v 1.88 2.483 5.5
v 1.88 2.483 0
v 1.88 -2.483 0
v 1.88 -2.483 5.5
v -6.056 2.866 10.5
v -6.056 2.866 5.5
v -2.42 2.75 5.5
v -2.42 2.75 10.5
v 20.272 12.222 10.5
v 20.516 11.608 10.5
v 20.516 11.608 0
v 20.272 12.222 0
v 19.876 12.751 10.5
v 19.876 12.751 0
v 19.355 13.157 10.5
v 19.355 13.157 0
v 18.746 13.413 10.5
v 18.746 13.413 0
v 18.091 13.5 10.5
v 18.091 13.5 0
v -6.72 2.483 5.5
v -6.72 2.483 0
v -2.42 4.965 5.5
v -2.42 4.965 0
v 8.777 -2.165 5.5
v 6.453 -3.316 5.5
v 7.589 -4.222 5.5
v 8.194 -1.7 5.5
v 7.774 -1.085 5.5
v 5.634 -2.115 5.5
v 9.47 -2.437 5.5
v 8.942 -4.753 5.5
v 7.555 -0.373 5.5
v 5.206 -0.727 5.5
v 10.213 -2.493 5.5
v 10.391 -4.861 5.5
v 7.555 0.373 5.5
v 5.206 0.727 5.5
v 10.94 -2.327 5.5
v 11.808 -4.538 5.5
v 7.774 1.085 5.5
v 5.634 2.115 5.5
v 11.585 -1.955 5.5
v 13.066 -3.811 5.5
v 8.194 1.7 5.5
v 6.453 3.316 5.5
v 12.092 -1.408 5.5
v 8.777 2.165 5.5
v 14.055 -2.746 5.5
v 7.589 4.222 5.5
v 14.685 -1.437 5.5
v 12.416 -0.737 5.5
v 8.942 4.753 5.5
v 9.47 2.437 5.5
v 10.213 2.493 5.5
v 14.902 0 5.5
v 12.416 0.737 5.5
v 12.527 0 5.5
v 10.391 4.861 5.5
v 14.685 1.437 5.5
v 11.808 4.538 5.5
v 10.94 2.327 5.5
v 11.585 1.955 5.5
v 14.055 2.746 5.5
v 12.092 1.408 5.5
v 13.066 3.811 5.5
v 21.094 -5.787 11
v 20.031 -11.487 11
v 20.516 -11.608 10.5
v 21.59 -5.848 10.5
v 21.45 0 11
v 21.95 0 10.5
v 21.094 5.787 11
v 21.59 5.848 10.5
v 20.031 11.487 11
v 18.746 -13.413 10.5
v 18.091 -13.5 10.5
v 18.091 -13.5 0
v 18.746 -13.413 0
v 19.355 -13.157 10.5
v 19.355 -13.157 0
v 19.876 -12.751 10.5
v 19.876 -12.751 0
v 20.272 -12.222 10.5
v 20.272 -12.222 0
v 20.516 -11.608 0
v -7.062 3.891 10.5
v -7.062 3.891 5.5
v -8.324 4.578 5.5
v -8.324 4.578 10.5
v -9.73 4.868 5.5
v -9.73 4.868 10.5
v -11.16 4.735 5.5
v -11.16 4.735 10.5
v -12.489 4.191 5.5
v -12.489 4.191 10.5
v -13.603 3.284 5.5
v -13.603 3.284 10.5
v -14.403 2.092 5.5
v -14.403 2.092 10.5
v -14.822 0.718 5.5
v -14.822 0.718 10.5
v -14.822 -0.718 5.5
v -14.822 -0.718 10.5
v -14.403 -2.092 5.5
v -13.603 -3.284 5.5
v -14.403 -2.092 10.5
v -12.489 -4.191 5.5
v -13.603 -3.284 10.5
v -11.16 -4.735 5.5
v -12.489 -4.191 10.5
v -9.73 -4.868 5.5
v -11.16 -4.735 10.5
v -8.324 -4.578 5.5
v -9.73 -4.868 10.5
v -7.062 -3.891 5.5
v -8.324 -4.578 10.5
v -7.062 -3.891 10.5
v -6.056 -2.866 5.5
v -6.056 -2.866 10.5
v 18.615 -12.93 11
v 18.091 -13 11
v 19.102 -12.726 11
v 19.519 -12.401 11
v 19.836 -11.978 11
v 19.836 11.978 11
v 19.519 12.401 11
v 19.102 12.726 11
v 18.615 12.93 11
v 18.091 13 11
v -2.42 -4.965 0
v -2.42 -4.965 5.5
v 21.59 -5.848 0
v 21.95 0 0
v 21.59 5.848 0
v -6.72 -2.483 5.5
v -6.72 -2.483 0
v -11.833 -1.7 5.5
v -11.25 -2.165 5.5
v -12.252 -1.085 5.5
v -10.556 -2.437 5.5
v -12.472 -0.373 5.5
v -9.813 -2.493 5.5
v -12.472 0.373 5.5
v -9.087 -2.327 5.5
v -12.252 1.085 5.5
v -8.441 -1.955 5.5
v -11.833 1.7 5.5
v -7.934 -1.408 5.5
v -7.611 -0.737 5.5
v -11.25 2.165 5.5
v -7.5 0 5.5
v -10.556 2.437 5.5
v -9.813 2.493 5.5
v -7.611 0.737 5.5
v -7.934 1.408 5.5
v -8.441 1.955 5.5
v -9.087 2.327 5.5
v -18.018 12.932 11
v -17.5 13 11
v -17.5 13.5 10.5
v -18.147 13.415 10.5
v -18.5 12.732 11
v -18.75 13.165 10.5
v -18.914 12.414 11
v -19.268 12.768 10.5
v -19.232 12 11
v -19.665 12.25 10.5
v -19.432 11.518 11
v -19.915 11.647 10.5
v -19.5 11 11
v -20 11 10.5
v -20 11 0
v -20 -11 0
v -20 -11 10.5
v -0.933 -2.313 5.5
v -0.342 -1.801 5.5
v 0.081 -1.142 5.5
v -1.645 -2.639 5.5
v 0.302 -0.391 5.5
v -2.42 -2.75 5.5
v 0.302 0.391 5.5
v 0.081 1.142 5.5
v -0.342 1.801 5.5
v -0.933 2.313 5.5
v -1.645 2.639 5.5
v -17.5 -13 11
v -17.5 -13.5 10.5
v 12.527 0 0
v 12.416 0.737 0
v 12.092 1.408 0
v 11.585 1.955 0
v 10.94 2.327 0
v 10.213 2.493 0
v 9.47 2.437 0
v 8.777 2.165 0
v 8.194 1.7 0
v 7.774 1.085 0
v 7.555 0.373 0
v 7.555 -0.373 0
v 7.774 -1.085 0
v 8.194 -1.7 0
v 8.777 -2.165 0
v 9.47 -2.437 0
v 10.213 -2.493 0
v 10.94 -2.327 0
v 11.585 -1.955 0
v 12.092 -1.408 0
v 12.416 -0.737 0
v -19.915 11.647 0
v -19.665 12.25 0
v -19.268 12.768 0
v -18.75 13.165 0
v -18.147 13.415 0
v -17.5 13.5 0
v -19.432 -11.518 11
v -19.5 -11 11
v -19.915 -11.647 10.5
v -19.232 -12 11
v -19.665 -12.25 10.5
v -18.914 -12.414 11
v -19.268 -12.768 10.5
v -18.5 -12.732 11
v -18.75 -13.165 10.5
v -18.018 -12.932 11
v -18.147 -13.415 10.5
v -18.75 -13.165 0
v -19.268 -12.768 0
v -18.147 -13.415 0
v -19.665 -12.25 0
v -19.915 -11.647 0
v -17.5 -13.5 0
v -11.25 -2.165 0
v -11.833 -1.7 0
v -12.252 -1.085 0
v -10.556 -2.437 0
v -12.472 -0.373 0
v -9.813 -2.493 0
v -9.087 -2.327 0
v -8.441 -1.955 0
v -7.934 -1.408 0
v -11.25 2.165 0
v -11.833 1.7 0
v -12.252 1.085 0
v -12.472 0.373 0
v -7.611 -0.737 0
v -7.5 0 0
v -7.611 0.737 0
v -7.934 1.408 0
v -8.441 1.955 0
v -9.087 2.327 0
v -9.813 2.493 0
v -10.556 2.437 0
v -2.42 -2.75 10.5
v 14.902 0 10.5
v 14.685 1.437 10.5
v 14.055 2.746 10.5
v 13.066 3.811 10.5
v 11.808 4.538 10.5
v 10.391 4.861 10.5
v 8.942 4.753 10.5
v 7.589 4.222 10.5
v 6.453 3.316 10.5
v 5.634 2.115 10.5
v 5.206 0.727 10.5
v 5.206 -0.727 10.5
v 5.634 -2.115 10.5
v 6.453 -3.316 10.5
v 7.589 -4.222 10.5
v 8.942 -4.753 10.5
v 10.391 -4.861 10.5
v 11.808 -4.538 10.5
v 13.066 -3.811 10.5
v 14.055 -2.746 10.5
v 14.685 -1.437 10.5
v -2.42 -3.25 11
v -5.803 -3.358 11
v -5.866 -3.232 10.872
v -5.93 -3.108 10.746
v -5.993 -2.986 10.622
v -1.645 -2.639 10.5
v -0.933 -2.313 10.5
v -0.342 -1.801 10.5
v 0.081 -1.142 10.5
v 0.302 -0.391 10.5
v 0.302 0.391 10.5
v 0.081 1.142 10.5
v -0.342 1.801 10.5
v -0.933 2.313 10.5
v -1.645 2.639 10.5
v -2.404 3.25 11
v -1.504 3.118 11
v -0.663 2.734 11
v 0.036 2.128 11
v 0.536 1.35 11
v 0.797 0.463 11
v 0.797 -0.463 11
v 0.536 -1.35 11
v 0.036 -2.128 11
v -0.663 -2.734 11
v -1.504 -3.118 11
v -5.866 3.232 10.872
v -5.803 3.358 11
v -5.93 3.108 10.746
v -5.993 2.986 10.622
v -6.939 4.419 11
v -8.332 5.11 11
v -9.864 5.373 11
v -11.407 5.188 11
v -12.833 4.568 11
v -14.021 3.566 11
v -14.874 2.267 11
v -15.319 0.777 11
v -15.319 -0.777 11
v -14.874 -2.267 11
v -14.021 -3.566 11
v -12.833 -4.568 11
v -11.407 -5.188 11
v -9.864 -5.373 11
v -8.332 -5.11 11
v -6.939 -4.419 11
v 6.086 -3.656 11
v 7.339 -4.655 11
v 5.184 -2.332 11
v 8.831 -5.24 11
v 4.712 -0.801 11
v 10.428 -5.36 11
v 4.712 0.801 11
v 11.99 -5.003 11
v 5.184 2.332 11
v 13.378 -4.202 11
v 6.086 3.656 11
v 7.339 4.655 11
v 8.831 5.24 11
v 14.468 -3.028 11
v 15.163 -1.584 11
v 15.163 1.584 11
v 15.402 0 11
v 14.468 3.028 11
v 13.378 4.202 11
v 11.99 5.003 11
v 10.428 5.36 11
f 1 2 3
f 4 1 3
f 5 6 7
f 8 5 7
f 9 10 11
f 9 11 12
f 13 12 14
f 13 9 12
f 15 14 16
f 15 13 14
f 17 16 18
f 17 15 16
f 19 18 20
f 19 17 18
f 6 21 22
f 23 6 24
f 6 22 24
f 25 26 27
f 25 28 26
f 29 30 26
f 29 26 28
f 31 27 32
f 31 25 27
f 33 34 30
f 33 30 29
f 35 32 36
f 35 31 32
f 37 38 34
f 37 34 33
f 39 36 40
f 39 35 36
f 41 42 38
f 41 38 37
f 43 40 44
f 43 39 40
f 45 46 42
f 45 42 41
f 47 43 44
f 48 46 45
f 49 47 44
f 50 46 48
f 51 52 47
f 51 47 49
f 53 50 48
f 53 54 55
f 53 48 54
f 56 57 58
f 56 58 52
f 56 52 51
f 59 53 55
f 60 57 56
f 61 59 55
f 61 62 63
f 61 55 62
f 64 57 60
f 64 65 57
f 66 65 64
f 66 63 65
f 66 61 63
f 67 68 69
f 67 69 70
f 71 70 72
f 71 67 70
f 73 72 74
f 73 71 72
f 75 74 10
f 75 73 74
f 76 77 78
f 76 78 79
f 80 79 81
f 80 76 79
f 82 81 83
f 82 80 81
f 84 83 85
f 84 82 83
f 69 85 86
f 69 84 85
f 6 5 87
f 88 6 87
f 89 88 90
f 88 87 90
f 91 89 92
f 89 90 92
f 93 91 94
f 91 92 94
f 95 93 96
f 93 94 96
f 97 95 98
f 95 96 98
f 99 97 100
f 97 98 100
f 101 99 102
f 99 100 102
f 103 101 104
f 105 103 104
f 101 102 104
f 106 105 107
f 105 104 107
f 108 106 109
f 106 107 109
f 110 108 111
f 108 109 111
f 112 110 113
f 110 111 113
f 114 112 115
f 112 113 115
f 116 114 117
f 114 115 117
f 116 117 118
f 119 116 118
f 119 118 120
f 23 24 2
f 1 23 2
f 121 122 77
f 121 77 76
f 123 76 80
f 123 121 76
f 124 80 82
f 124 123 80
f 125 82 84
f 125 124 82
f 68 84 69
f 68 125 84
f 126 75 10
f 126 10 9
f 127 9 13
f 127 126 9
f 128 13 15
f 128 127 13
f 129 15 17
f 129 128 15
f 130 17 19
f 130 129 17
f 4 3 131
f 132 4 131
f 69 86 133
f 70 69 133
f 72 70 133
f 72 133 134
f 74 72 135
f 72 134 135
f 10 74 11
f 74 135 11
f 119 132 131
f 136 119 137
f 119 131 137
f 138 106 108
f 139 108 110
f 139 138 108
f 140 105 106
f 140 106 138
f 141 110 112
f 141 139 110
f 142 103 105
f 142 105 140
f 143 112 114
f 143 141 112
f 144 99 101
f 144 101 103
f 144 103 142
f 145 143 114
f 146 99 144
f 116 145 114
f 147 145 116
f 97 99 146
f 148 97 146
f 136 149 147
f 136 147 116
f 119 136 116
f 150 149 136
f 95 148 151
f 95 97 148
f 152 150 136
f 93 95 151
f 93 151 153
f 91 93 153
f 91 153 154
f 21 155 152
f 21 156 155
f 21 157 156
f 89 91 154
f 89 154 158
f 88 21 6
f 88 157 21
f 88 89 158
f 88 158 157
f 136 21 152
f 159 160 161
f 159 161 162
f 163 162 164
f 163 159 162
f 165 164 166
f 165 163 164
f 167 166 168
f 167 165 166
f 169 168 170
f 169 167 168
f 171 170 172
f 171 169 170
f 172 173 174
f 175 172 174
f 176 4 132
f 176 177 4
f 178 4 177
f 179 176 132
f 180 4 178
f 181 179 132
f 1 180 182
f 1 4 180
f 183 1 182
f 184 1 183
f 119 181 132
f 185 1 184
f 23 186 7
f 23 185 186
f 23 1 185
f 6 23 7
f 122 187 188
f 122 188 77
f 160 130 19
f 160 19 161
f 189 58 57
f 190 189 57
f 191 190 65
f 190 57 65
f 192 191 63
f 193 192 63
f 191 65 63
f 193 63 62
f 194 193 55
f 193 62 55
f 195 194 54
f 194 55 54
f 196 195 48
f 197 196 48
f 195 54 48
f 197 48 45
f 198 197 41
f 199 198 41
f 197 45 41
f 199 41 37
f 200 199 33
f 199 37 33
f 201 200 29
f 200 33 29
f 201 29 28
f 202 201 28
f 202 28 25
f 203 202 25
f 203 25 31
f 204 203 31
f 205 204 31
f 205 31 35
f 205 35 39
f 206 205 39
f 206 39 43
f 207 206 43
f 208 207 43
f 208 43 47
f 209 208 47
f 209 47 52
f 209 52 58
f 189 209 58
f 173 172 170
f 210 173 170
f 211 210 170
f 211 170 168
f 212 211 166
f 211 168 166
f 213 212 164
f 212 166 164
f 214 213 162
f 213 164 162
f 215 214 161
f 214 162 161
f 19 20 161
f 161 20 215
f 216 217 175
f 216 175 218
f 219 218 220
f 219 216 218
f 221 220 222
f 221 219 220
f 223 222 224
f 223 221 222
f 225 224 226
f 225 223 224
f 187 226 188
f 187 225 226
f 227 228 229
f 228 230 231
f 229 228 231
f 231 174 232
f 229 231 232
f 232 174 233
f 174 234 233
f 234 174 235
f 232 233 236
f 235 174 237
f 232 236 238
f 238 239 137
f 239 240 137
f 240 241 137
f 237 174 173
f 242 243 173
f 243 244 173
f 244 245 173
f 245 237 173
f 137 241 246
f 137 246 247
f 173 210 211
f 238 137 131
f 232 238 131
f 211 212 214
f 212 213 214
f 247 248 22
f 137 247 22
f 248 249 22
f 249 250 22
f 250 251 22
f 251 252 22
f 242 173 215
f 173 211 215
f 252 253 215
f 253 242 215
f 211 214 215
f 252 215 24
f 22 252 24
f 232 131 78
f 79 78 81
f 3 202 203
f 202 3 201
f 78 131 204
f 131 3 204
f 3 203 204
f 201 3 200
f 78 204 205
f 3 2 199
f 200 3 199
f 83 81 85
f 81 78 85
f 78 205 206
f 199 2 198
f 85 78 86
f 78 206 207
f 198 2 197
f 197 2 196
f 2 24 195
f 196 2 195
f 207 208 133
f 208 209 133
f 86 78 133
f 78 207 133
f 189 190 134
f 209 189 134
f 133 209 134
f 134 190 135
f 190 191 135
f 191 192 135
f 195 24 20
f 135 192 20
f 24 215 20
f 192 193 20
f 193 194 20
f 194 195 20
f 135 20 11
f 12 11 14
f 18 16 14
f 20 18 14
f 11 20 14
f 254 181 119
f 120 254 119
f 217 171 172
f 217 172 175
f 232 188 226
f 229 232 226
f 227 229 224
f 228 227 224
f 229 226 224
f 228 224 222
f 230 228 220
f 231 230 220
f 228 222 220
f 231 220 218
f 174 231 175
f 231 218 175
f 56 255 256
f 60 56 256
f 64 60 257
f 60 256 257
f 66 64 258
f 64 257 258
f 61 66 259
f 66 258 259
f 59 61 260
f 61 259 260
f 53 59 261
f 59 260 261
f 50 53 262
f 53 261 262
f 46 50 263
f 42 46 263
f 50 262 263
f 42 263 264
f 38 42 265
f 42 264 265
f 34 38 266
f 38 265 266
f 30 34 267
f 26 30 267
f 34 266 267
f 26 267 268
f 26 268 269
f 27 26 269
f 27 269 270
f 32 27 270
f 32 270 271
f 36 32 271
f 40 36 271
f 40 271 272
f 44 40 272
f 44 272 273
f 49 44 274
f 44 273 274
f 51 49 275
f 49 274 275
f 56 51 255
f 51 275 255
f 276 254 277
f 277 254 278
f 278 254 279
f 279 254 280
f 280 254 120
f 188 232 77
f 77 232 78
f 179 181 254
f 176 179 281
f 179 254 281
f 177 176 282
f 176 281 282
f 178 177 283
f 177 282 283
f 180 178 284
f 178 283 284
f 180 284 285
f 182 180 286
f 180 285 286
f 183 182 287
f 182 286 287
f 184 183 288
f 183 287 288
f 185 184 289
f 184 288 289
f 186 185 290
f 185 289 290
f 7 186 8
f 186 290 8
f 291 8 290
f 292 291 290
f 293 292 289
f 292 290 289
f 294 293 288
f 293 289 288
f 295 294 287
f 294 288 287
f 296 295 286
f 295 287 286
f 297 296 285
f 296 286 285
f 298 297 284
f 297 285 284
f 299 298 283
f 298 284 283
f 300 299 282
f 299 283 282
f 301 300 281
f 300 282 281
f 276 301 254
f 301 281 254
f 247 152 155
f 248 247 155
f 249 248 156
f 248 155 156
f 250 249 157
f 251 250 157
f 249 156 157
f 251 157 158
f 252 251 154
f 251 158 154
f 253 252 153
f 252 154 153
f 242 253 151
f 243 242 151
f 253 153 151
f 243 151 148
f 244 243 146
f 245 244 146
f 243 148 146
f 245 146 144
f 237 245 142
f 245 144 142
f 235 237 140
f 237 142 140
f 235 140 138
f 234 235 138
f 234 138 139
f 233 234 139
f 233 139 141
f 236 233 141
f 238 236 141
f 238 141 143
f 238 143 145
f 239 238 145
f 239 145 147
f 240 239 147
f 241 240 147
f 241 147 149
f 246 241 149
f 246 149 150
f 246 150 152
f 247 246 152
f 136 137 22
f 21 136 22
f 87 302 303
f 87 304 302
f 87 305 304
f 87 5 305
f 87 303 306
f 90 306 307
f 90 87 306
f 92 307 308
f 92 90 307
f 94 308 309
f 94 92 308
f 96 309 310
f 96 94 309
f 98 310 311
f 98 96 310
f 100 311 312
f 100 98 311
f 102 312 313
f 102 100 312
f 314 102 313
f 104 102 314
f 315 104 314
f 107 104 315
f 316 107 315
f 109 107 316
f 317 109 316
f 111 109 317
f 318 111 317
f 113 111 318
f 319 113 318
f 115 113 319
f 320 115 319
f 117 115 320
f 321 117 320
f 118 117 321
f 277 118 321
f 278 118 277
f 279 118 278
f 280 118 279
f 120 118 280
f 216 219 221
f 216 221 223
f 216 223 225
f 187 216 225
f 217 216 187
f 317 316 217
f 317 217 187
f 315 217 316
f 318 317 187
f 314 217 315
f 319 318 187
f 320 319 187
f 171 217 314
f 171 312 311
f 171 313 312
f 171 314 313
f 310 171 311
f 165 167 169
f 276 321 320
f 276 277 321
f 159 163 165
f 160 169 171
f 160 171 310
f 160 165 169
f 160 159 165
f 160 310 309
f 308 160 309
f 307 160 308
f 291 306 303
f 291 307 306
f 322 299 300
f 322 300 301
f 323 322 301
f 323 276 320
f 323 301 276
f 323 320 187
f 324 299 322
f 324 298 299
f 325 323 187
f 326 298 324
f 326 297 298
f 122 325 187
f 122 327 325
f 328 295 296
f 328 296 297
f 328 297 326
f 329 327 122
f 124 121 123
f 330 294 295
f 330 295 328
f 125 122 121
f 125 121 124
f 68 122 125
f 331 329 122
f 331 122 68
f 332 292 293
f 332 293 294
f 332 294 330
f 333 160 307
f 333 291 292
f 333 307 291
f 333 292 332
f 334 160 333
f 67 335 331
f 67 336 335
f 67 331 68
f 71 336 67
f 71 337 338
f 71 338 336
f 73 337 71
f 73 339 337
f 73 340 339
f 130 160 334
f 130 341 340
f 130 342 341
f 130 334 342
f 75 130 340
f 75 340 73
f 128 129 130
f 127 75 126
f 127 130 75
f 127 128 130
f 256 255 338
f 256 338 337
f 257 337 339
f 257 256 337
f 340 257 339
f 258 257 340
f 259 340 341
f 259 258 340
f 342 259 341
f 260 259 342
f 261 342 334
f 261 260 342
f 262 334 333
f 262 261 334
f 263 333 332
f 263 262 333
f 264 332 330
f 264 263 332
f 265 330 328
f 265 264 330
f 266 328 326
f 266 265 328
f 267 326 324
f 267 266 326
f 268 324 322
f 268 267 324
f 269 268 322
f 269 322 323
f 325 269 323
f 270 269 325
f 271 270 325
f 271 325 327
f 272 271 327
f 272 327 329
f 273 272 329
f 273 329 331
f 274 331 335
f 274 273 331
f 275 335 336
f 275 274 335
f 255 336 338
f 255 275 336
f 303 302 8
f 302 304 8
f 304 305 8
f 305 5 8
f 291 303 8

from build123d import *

# Parameters (mm, degrees)
BOSS_EXTRUDE1_DEPTH     = 11
SKETCH2_R               = 2.5
CUT_EXTRUDE1_DEPTH      = 29.018788339
SKETCH3_R               = 4.875
CUT_EXTRUDE2_DEPTH      = 5.5
SKETCH4_R               = 2.75
CUT_EXTRUDE3_DEPTH      = 29.018788339
CUT_EXTRUDE4_DEPTH      = 5.5
FILLET1_R               = 2.5
CHAMFER1_SIZE           = 0.5
CUT_EXTRUDE5_DEPTH      = 29.018788339
CUT_EXTRUDE5_DEPTH_BACK = 29.018788339
CHAMFER3_SIZE           = 0.5


with BuildPart() as part:
    # Sketch1 → Boss-Extrude1 (new body)
    with BuildSketch(Plane.XY):
        with BuildLine():
            Line((-20, -13.5), (20, -13.5))
            ThreePointArc((20, -13.5), (21.95, 0), (20, 13.5))
            Line((20, 13.5), (-20, 13.5))
            Line((-20, 13.5), (-20, -13.5))
        make_face()
    extrude(amount=BOSS_EXTRUDE1_DEPTH)

    # Sketch2 → Cut-Extrude1 (cut, through all)
    with BuildSketch(Plane.XY.offset(11)):
        with Locations((-10, 0)):
            Circle(SKETCH2_R)
        with Locations((10.026646142, 0)):
            Circle(SKETCH2_R)
    extrude(amount=-CUT_EXTRUDE1_DEPTH, mode=Mode.SUBTRACT)

    # Sketch3 → Cut-Extrude2 (cut)
    with BuildSketch(Plane.XY.offset(11)):
        with Locations((-10, 0)):
            Circle(SKETCH3_R)
        with Locations((10.026646142, 0)):
            Circle(SKETCH3_R)
    extrude(amount=-CUT_EXTRUDE2_DEPTH, mode=Mode.SUBTRACT)

    # Sketch4 → Cut-Extrude3 (cut, through all)
    with BuildSketch(Plane.XY.offset(11)):
        with Locations((-2.42, 0)):
            Circle(SKETCH4_R)
    extrude(amount=-CUT_EXTRUDE3_DEPTH, mode=Mode.SUBTRACT)

    # Sketch5 → Cut-Extrude4 (cut)
    with BuildSketch(Plane(origin=(0, 0, 0), x_dir=(-1, 0, 0), z_dir=(0, 0, -1))):
        Polygon((6.72, -2.482606158), (6.72, 2.482606158), (2.42, 4.965212315), (-1.88, 2.482606158), (-1.88, -2.482606158), (2.42, -4.965212315), align=None)
    extrude(amount=-CUT_EXTRUDE4_DEPTH, mode=Mode.SUBTRACT)

    # Fillet1
    fillet1_edges = [part.edges().sort_by_distance(p)[0] for p in [
        (20, -13.5, 5.5),
        (-20, -13.5, 5.5),
        (-20, 13.5, 5.5),
        (20, 13.5, 5.5),
    ]]
    fillet(fillet1_edges, radius=FILLET1_R)

    # Chamfer1
    chamfer1_edges = [part.edges().sort_by_distance(p)[0] for p in [
        (0.295627716, -13.5, 11),
        (-20, 0, 11),
        (21.95, 0, 11),
        (0.295627716, 13.5, 11),
        (19.628977191, 12.971144792, 11),
        (19.628977191, -12.971144792, 11),
        (-19.267766953, 12.767766953, 11),
        (-19.267766953, -12.767766953, 11),
    ]]
    chamfer(chamfer1_edges, length=CHAMFER1_SIZE)

    # Sketch6 → Cut-Extrude5 (cut, two sides: drawn at the far end of the back side and taken through both)
    with BuildSketch(Plane.XY.offset(11).offset(-CUT_EXTRUDE5_DEPTH_BACK)):
        with BuildLine():
            Line((-6.05629261, 2.865797798), (-2.42, 2.75))
            ThreePointArc((-2.42, 2.75), (0.33, 0), (-2.42, -2.75))
            Line((-2.42, -2.75), (-6.05629261, -2.865797798))
            Line((-6.05629261, -2.865797798), (-6.72, -2.482606158))
            Line((-6.72, -2.482606158), (-6.72, 2.482606158))
            Line((-6.72, 2.482606158), (-6.05629261, 2.865797798))
        make_face()
    extrude(amount=CUT_EXTRUDE5_DEPTH + CUT_EXTRUDE5_DEPTH_BACK, mode=Mode.SUBTRACT)

    # Chamfer3
    chamfer3_edges = [part.edges().sort_by_distance(p)[0] for p in [
        (0.33, 0, 11),
        (-14.875, 0, 11),
        (-4.238146305, 2.807898899, 11),
        (-4.238146305, -2.807898899, 11),
        (5.151646142, 0, 11),
    ]]
    chamfer(chamfer3_edges, length=CHAMFER3_SIZE)


solid = part.part
